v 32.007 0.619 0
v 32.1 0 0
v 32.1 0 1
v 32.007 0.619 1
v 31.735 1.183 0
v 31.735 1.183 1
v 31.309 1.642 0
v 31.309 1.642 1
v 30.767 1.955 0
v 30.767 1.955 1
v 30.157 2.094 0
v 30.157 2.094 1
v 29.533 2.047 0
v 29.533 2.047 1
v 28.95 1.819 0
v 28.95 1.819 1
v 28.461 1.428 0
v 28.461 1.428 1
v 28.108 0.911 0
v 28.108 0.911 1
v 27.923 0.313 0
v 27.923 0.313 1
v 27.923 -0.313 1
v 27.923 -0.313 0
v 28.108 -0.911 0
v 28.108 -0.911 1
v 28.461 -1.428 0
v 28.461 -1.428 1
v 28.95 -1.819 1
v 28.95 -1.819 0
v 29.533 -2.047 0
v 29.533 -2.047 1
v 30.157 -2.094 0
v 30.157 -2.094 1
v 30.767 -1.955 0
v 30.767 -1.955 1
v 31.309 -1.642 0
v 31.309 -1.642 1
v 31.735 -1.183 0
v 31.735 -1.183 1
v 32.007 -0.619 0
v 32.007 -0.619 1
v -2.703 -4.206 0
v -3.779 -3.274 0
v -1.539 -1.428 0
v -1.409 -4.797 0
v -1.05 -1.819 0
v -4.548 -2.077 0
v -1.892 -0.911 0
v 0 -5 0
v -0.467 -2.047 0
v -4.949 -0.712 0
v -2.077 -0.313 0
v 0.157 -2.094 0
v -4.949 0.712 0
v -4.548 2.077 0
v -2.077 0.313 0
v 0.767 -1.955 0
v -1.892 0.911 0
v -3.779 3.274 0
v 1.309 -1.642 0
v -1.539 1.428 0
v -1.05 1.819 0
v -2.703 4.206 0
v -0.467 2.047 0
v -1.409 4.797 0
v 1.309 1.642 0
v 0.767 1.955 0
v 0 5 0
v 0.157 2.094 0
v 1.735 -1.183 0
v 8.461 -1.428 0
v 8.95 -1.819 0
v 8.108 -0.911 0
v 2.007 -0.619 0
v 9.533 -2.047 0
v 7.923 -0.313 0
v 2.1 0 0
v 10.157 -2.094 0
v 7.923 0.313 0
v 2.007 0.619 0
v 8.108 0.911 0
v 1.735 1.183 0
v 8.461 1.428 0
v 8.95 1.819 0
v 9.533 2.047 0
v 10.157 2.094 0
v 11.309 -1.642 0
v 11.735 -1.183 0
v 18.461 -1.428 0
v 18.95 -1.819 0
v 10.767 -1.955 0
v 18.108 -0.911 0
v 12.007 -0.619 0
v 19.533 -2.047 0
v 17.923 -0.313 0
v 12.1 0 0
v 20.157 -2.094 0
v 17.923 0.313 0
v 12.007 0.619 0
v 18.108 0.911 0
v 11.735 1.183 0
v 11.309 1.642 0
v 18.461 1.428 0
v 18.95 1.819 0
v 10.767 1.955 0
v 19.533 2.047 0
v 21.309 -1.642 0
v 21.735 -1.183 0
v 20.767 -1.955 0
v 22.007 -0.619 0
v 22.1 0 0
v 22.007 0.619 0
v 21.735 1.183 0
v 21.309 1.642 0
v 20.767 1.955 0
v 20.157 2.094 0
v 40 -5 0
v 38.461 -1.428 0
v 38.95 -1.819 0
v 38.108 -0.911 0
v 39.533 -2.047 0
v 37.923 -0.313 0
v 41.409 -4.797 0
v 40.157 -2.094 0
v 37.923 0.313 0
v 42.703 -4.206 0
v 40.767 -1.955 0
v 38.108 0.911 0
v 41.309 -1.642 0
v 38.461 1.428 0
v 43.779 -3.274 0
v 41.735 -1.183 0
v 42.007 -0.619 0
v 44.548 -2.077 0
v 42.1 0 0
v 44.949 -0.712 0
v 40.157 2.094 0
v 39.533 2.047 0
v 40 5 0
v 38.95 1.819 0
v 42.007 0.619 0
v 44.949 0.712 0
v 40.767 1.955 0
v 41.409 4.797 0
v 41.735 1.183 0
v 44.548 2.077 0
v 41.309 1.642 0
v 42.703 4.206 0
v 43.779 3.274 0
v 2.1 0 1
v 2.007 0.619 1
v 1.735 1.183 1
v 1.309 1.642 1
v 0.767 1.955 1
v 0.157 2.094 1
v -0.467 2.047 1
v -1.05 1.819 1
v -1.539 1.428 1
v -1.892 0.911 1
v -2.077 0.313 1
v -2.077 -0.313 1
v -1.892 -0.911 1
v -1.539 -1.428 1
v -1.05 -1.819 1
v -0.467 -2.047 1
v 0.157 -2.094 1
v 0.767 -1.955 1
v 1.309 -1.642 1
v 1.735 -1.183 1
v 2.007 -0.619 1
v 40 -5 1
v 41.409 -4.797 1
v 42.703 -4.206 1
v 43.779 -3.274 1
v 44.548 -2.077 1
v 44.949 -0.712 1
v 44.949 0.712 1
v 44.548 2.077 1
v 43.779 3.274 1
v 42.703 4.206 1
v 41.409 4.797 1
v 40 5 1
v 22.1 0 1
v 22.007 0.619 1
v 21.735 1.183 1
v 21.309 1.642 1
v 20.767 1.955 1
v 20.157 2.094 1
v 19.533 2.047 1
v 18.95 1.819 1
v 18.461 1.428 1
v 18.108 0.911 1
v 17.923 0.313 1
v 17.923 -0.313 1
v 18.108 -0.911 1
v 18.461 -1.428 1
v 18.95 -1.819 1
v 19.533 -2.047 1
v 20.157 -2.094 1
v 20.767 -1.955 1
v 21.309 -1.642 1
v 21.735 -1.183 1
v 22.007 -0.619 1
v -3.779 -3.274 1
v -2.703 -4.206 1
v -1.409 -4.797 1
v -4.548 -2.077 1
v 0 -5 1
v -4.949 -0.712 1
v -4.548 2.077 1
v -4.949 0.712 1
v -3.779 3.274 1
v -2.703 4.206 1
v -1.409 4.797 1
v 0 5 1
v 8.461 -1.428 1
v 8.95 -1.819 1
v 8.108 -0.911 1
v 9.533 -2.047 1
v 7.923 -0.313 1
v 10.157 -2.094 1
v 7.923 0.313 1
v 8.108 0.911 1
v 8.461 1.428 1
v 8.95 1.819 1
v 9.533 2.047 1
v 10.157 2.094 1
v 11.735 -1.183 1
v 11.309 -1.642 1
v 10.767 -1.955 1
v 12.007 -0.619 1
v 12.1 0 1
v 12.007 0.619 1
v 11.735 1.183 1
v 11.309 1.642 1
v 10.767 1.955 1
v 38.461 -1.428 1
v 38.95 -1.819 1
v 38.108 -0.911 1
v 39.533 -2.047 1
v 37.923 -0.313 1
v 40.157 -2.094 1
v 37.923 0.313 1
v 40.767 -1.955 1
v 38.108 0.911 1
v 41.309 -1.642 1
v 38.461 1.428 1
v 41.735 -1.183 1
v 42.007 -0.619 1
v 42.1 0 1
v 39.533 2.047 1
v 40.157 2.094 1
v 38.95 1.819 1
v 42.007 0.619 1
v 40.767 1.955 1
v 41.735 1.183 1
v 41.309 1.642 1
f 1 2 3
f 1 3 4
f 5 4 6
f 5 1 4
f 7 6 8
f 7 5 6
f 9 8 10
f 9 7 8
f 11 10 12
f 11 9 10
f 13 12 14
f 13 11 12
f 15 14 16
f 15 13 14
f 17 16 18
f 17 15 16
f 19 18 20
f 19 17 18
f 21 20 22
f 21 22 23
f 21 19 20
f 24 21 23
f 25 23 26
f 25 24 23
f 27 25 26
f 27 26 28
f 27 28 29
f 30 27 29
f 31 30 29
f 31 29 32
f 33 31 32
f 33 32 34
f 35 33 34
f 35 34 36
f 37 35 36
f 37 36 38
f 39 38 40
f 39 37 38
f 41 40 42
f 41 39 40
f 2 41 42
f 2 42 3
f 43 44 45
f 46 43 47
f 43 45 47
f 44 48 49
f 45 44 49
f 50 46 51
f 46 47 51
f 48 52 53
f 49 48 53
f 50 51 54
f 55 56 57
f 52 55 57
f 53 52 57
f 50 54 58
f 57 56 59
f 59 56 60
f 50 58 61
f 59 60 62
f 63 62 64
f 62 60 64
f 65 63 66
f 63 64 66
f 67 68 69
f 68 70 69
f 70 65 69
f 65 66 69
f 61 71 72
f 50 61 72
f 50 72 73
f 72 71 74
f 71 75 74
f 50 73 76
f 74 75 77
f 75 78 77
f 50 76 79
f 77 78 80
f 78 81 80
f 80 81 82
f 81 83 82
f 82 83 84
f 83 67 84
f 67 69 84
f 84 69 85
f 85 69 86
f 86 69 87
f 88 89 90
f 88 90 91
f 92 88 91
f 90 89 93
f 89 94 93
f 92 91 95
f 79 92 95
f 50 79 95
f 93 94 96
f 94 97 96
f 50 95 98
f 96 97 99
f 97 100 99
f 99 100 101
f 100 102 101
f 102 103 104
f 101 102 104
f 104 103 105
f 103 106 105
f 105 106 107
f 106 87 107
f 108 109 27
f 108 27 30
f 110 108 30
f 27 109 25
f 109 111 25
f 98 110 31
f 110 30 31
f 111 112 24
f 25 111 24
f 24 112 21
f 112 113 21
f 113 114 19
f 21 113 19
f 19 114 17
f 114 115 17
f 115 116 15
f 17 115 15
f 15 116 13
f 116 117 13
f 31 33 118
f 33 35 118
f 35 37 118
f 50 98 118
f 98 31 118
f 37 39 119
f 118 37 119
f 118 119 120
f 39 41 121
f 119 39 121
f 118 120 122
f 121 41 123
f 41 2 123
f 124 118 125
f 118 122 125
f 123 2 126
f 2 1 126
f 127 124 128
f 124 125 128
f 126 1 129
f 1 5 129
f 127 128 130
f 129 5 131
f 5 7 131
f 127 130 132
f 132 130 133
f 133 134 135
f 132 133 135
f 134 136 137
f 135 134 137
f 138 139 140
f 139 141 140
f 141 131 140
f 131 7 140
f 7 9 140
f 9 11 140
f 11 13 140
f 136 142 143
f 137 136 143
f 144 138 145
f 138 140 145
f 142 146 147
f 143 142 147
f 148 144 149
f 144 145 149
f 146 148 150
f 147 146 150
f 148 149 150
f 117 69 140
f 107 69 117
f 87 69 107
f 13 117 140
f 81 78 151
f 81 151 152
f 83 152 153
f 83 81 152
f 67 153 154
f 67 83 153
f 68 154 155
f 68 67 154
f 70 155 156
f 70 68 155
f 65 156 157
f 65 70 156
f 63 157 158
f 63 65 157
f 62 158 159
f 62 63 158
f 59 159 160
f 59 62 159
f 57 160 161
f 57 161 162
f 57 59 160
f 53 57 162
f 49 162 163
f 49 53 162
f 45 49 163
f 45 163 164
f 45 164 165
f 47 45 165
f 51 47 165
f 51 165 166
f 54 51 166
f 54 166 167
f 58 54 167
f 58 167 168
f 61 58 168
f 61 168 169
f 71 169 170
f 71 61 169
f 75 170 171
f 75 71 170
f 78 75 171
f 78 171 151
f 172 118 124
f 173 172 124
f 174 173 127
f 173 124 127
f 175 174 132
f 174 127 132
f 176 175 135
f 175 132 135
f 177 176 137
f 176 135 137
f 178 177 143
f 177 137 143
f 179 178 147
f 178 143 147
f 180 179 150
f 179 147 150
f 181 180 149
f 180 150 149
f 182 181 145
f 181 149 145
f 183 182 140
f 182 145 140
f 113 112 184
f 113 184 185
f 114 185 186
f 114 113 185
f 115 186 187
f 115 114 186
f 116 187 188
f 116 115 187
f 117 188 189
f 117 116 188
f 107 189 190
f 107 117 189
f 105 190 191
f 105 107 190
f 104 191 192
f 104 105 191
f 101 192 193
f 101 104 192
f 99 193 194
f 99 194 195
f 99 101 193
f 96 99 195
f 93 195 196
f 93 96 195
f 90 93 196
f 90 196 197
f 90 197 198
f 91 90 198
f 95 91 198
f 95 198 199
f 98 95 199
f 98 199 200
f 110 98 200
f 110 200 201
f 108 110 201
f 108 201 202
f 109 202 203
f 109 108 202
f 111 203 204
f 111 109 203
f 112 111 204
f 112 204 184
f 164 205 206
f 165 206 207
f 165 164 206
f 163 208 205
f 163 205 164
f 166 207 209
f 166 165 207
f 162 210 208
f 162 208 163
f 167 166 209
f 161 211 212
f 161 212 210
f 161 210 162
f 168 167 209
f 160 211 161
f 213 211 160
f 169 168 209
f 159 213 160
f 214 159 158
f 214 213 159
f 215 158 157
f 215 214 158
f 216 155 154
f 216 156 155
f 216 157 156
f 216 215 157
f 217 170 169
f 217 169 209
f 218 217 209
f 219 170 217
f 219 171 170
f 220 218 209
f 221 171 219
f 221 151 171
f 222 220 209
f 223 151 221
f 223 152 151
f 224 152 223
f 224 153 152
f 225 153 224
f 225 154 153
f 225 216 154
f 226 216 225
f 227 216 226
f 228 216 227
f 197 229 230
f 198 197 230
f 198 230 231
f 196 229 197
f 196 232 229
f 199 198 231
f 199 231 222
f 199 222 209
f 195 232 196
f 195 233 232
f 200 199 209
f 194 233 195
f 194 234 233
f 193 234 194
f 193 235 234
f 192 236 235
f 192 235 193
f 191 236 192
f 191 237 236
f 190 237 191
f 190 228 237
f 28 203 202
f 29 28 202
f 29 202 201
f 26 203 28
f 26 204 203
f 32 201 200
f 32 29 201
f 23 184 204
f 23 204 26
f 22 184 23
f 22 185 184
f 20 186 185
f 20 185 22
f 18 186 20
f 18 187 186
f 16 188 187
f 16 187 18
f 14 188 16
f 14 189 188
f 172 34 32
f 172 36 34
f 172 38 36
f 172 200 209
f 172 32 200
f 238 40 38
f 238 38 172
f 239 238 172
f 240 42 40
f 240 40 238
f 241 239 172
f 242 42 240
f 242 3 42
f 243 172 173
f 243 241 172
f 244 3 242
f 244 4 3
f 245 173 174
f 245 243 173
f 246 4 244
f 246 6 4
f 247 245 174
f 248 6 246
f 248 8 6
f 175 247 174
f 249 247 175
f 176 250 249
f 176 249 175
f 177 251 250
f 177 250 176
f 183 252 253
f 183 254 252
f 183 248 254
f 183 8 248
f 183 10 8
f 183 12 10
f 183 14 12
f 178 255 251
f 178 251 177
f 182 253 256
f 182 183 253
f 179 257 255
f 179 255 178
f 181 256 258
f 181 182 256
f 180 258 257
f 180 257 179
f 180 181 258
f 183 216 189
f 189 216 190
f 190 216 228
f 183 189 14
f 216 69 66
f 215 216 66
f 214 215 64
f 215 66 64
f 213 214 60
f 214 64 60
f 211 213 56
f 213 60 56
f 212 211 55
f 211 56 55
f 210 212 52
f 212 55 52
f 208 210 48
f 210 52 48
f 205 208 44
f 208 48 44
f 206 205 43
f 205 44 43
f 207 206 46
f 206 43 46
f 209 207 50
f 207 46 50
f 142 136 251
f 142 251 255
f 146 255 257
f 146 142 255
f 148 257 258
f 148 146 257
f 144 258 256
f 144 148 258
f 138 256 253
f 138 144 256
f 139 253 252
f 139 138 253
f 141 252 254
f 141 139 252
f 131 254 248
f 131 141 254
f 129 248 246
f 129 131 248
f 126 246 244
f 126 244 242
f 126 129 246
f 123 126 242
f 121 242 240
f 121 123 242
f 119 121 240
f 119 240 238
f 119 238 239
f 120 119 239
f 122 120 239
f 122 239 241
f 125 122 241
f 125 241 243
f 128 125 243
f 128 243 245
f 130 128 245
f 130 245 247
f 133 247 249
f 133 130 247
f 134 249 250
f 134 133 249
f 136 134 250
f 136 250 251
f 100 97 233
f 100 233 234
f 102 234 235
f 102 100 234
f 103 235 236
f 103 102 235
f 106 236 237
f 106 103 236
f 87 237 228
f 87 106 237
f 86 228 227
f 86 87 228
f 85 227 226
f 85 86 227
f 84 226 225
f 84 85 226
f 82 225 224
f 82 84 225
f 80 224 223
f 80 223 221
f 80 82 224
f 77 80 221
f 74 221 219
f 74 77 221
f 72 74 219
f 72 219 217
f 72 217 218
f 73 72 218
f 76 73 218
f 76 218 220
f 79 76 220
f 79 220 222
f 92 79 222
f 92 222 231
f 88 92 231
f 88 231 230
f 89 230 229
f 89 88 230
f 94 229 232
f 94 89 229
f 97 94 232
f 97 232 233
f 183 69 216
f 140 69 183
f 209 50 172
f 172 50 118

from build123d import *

# Parameters (mm, degrees)
SKETCH_R  = 2.1
PAD_DEPTH = 1


with BuildPart() as part:
    # Sketch → Pad (new body)
    with BuildSketch(Plane.XY):
        with BuildLine():
            ThreePointArc((0, 5), (-5, 0), (0, -5))
            Line((0, -5), (40, -5))
            ThreePointArc((40, -5), (45, 0), (40, 5))
            Line((0, 5), (40, 5))
        make_face()
        Circle(SKETCH_R, mode=Mode.SUBTRACT)
        with Locations((10, 0)):
            Circle(SKETCH_R, mode=Mode.SUBTRACT)
        with Locations((20, 0)):
            Circle(SKETCH_R, mode=Mode.SUBTRACT)
        with Locations((30, 0)):
            Circle(SKETCH_R, mode=Mode.SUBTRACT)
        with Locations((40, 0)):
            Circle(SKETCH_R, mode=Mode.SUBTRACT)
    extrude(amount=PAD_DEPTH)


solid = part.part
